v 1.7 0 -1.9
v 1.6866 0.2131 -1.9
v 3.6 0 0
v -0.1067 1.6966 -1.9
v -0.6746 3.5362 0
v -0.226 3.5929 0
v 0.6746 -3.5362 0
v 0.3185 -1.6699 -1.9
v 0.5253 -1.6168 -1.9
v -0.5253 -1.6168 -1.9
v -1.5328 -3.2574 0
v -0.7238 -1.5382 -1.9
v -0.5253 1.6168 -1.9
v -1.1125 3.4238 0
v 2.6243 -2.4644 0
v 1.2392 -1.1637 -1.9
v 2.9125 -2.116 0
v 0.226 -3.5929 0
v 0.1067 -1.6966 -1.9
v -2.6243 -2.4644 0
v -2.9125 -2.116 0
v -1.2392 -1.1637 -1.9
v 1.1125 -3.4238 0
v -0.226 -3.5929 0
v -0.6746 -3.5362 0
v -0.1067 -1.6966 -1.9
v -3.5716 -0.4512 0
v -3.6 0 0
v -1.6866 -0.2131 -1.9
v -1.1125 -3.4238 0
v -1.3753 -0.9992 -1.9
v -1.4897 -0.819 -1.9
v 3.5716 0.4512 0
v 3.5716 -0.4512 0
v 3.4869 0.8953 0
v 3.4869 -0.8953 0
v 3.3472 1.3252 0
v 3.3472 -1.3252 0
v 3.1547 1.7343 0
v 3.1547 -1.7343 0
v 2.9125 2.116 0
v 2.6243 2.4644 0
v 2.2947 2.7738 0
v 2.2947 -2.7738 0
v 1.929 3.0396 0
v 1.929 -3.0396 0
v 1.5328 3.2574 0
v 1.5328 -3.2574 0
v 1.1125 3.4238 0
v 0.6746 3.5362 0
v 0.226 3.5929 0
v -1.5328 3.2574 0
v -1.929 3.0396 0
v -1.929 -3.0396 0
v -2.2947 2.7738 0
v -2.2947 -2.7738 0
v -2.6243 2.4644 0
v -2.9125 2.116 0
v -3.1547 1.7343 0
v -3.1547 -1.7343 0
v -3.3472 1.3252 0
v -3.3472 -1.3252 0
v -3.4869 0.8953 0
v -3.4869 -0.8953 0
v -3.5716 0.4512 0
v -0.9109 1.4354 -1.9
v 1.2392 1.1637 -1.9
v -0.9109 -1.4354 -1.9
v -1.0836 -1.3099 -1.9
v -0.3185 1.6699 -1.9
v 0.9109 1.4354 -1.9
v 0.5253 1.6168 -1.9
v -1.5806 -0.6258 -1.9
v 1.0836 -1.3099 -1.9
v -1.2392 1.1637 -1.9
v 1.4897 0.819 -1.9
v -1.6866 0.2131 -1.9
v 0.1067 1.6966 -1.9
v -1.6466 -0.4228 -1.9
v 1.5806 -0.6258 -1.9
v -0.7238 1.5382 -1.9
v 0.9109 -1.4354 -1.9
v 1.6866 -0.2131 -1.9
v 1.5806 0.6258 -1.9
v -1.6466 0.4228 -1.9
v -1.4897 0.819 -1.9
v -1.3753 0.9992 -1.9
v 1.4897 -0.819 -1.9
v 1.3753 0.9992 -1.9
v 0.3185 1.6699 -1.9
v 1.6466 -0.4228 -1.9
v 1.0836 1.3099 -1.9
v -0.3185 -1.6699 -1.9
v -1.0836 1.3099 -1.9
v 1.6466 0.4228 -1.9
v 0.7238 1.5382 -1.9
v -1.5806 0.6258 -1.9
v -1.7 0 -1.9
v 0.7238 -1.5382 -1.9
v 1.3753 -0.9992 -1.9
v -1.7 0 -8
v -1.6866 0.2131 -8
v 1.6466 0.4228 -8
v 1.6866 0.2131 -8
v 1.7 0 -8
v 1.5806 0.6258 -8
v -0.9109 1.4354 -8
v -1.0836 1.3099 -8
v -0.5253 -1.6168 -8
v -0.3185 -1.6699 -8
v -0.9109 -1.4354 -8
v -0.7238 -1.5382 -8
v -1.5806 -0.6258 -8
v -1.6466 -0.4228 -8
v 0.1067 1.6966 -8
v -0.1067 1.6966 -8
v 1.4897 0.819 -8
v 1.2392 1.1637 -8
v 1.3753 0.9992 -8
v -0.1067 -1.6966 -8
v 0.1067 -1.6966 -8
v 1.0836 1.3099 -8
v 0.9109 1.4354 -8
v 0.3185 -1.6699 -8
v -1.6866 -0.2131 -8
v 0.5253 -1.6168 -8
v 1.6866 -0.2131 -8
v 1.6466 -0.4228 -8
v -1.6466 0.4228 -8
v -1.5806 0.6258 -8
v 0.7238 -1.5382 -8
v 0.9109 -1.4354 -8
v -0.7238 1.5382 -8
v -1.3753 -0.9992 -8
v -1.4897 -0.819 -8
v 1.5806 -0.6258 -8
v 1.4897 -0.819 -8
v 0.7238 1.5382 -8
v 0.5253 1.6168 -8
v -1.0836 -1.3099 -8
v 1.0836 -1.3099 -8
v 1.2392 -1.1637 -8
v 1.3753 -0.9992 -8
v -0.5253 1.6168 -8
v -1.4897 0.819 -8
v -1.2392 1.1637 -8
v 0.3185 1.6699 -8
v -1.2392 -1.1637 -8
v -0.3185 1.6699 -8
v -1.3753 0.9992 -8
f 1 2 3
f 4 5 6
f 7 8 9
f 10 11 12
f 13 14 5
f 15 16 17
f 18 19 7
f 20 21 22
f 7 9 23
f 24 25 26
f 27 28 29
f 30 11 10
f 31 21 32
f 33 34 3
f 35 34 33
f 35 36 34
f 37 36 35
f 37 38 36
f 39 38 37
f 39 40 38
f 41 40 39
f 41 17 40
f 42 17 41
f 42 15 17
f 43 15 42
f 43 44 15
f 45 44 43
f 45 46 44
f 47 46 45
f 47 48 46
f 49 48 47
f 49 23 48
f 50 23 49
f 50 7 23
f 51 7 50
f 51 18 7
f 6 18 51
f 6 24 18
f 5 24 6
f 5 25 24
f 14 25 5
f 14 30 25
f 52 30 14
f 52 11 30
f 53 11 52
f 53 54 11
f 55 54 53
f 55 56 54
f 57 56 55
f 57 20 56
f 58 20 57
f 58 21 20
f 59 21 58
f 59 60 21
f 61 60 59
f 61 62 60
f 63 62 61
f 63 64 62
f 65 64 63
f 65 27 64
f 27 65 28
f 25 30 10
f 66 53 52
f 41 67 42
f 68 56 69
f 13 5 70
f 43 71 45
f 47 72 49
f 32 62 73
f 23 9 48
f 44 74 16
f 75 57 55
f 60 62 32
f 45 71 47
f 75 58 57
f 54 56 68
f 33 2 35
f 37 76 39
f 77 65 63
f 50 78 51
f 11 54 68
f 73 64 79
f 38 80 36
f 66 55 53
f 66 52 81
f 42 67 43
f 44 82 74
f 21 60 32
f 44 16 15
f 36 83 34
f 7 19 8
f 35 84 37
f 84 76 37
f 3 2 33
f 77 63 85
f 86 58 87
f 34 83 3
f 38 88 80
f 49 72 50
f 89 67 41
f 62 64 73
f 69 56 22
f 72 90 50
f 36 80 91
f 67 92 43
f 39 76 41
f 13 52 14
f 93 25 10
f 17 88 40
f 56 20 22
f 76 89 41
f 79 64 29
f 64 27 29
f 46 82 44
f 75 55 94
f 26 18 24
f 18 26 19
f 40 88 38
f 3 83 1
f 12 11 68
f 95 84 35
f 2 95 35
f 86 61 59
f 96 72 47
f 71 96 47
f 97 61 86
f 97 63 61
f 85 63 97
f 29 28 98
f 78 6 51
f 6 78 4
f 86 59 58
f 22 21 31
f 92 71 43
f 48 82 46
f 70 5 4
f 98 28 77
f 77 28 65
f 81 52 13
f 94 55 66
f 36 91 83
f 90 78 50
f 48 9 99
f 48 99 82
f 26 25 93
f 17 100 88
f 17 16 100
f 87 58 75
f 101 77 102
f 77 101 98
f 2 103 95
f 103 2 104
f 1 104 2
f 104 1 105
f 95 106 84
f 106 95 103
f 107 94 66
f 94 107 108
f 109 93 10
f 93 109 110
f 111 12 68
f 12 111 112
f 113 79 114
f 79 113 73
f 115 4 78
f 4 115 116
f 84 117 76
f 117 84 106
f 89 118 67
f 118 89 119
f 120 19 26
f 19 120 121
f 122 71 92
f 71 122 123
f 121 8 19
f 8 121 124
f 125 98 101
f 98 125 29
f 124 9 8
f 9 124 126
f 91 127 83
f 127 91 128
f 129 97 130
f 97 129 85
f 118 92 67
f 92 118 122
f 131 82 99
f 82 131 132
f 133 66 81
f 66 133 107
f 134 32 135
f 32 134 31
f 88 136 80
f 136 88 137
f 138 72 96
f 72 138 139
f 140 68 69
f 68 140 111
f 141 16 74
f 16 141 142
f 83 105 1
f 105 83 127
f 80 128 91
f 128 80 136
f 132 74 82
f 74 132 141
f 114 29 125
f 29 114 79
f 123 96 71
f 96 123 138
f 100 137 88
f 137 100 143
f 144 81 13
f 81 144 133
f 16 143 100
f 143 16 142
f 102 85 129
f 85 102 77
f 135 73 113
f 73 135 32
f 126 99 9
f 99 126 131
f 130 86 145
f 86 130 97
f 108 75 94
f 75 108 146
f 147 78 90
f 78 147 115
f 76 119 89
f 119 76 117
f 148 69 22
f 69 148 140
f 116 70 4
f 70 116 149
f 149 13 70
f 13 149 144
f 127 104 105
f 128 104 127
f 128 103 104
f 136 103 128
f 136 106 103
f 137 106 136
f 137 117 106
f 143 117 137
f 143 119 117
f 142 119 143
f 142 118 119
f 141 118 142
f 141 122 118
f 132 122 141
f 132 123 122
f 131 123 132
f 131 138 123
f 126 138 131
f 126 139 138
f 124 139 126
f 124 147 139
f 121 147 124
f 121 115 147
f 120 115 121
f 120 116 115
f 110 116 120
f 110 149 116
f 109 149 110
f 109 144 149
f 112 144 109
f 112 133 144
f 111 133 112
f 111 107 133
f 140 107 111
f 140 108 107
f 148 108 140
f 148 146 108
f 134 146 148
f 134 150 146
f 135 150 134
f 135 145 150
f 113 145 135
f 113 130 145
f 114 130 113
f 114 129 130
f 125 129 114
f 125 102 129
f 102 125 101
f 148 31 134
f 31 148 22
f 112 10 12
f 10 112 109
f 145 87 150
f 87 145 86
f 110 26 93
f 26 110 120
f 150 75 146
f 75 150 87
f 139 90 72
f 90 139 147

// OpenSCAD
// Generated by SolidPython 1.1.3 on 2023-03-13 21:43:02
$fn = 50;


difference() {
	union() {
		translate(v = [0, 0, -1.9000000000]) {
			rotate(a = [0, 0, 0]) {
				cylinder(h = 1.9000000000, r1 = 1.7000000000, r2 = 3.6000000000);
			}
		}
		translate(v = [0, 0, -8]) {
			rotate(a = [0, 0, 0]) {
				cylinder(h = 8, r = 1.7000000000);
			}
		}
	}
	union();
}
/***********************************************
*********      SolidPython code:      **********
************************************************
 
from solid import *
import os
import subprocess

import oomB

import opsc_library_gen

mode = "laser"
#mode = "3d_print"

defined_objects = {}

radius_dict = {}
countersunk_dict = {}


def set_mode(m):
    global mode
    mode = m
    radius_dict['M6'] = 6.5/2
    radius_dict['M3'] = 3.3/2
    if mode == "laser":
        radius_dict['M6'] = 6/2
        radius_dict['M3'] = 3/2

    countersunk_dict['M3'] = {}
    countersunk_dict['M3']['little_rad'] = radius_dict['M3']
    countersunk_dict['M3']['big_rad'] = (5.5+0.6)/2
    if mode == "laser":
        countersunk_dict['M3']['big_rad'] = (4.75+0.6)/2
        countersunk_dict['M3']['little_rad'] = (4.75+0.6)/2

    countersunk_dict['M3']['height'] = 1.7


def opsc_make_object(filename, objects, save_type="none",resolution=50, layers = 1, tilediff = 200, mode="laser", overwrite=True):
    if overwrite or not os.path.exists(filename):
        set_mode(mode)
        save_type = save_type.lower()
        os.makedirs(os.path.dirname(filename), exist_ok=True)
        final_object = opsc_get_object(objects, mode = mode)
        # Save the final object to the specified filename    
        scad_render_to_file(final_object, filename, file_header='$fn = %s;' % resolution, include_orig_code=True)
        if save_type == "all":
            saveToAll(filename)
        elif save_type == "dxf":
            saveToDxf(filename)
        if mode == "laser":
            filename_laser = filename.replace(".scad","-flat.scad")
            scad_render_to_file(getLaser(final_object, layers=layers, tilediff=tilediff), filename_laser, file_header='$fn = %s;' % resolution, include_orig_code=True)
            if save_type == "all":
                saveToAll(filename_laser)
            elif save_type == "dxf":
                saveToDxf(filename_laser)


def opsc_get_object(objects, mode = "laser"):
    # Create the solidpython objects only include the positive objects and if they don't have inclusion or their inclusion is either all or mode
    # Initialize an empty list to store the results
    positive_objects = []

    # Iterate over the "objects" list
    for obj in objects:
        # Check if the current object has a "type" key with a value of "positive"
        if obj['type'] == 'positive':
            # Check if the current object has an "inclusion" key and its value matches "mode",
            # or if the current object does not have an "inclusion" key at all
            if not 'inclusion' in obj or obj['inclusion'] == "all" or obj['inclusion'] == mode:
                # Call the "get_opsc_item" function with the current object as an argument
                opsc_item = get_opsc_item(obj)
                # Add the result to the "positive_objects" list
                positive_objects.append(opsc_item)
# Initialize an empty list to store the results
    negative_objects = []

    # Iterate over the "objects" list
    for obj in objects:
        # Check if the current object has a "type" key with a value of "negative"
        if obj['type'] == 'negative':
            # Check if the current object has an "inclusion" key and its value matches "mode",
            # or if the current object does not have an "inclusion" key at all
            if not 'inclusion' in obj or obj['inclusion'] == "all" or obj['inclusion'] == mode:
                # Call the "get_opsc_item" function with the current object as an argument
                opsc_item = get_opsc_item(obj)
                # Add the result to the "negative_objects" list
                negative_objects.append(opsc_item)
    
    #positive_objects = [get_opsc_item(obj) for obj in objects if obj['type'] == 'positive']
    #negative_objects = [get_opsc_item(obj) for obj in objects if obj['type'] == 'negative']
    # Union the positive objects
    positive_object = union()(*positive_objects)
    # Union the negative objects
    negative_object = union()(*negative_objects)
    # Create the final object by subtracting the negative objects from the positive objects
    return difference()(positive_object, negative_object)

def get_opsc_item(params):
    # A dictionary to map radius string values to numerical values
    #radius_dict = {'small': 5, 'medium': 10, 'large': 15}
    # An array of function names for basic shapes
    basic_shapes = ['cube', 'sphere', 'cylinder']
    
    # An array of function names for other shapes
    other_shapes = ['hole', 'slot', 'rounded_rectangle', 'countersunk', 'polyg']
    


    # Convert radius to r if present, and remove radius from the params dictionary
    if 'radius' in params:
        if isinstance(params['radius'], str):
            # Use the radius_dict to map the radius string value to a numerical value
            params['r'] = radius_dict[params['radius']]
        else:
            params['r'] = params['radius']
        del params['radius']
    

    # Check if the object type is a basic shape
    if params['shape'] in basic_shapes:
        # Remove shape and unexpected dictionary values
        allowed_keys = {'size', 'r', 'r1', 'r2', 'd', 'h', 'rw', 'rh', 'dw', 'dh'}
        shape_params = {k: v for k, v in params.items() if k in allowed_keys}

        #params['m'] = "#"
        ###split for adding modifier
        try:
            m = params['m']
            func = globals()[params['shape']]
            return_value = get_opsc_transform(params,func(**shape_params))
            return_value = (return_value).set_modifier(m)
            return return_value
        except KeyError as e:
            return get_opsc_transform(params,globals()[params['shape']](**shape_params))
        
    elif params['shape'] == 'polygon':
        # Remove shape and unexpected dictionary values
        h  = params['height']
        allowed_keys = {'points'}
        shape_params = {k: v for k, v in params.items() if k in allowed_keys}

        # Call the corresponding function for the shape parameter, using ** notation to pass the shape_params dictionary as keyword arguments
        params["rot"] = [0,0,0]        
        try:
            m = params['m']
            func = globals()[params['shape']]
            return_value = get_opsc_transform(params,linear_extrude(h)(globals()[params['shape']](**shape_params)))
            return_value = (return_value).set_modifier(m)
            return return_value
        except KeyError as e:
            return_value = get_opsc_transform(params,linear_extrude(h)(globals()[params['shape']](**shape_params)))
            return_value = (return_value)
            return return_value


    # If the object type is not a basic shape, check if it's a defined object or one of the other shapes
    elif params['shape'] in other_shapes:
        # Call the corresponding function for the shape parameter, passing the params dictionary as an argument
        p2 = copy.deepcopy(params)
        p2["pos"] = [0,0,0]
        return get_opsc_transform(params,globals()[params['shape']](p2))
    
    # If the object is not a basic shape or a defined object, try to import it from a .scad file
    else:
        obj = defined_objects[params['shape']]
        return get_opsc_transform(params,obj)

def get_opsc_transform(params, solid_obj):
    # Rotate the object based on the 'rot' field in the params dictionary, or the 'rotX', 'rotY', and 'rotZ' fields if 'rot' is not present
    rot = params.get('rot', [])
    if rot:
        rotX, rotY, rotZ = rot
    else:
        rotX = params.get('rotX', 0)
        rotY = params.get('rotY', 0)
        rotZ = params.get('rotZ', 0)
    solid_obj = rotate([rotX, rotY, rotZ])(solid_obj)

    # Translate the object based on the 'pos' field in the params dictionary, or the 'x', 'y', and 'z' fields if 'pos' is not present
    pos = params.get('pos', [])
    if pos:
        x, y, z = pos
    else:
        x = params.get('x', 0)
        y = params.get('y', 0)
        z = params.get('z', 0)
    solid_obj = translate([x, y, z])(solid_obj)
    return solid_obj


import random

def opsc_easy_array(type, shape, repeats, pos_start, shift_arr, **kwargs):
    for i in range(0,3):
        repeats.append(1)
        pos_start.append(0)
        shift_arr.append(0)
    return_objects = []

    for x in range(0,repeats[0]):
        for y in range(0,repeats[1]):
            for z in range(0,repeats[2]):
                return_objects.append(opsc_easy(type, shape, pos=[pos_start[0]+x*shift_arr[0],pos_start[1]+y*shift_arr[1],pos_start[2]+z*shift_arr[2]], **kwargs))
    return return_objects                



def opsc_easy(type, shape, **kwargs):
    obj = {
        'type': type,
        'shape': shape
    }
    for param in ['size', 'r', 'r1', 'r2', 'd', 'h', 'rw', 'rh', 'dw', 'dh', 'pos', 'x', 'y', 'z', 'rot', 'rotX', 'rotY', 'rotZ', "w", "inclusion", 'sides', 'height', "m"]:
        if param in kwargs:
            obj[param] = kwargs[param]
    return obj

def hole(params):
    p2 = copy.deepcopy(params)  
    # Check if the radius is a string and replace it with the corresponding value from the dictionary
    if isinstance(p2['r'], str):
        p2['r'] = radius_dict[p2['r']]
    
    # Set the height to 100 if not specified
    if 'h' not in p2:
        p2['h'] = 100
        p2["pos"] = [0,0,-50]
    p2["center"] = True
    # Create the cylinder object
    p2["shape"] = "cylinder"
    p2["type"] = "positive"

    return get_opsc_item(p2)

import copy

def countersunk(params):
    p2 = copy.deepcopy(params)
    counter_rad = p2['r']
    p2['r'] = radius_dict[p2['r']]
    hp = copy.deepcopy(p2)
    hp["type"] = "positive"
    hp["shape"] = "hole"
    del hp["rot"]
    hol = get_opsc_item(hp)
    
    cp = copy.deepcopy(p2)
    cp["h"] = countersunk_dict[counter_rad]["height"]
    cp["r2"] = countersunk_dict[counter_rad]["little_rad"]
    cp["r1"] = countersunk_dict[counter_rad]["big_rad"]
    del cp["r"]
    del cp["rot"]
    cp["type"] = "positive"
    cp["shape"] = "cylinder"
    cp["pos"] = [0,0,0]

    top = get_opsc_item(cp)
    return union()(hol,top)



def slot(params):  
    p2 = copy.deepcopy(params) 
    if isinstance(p2['r'], str):
        p2['r'] = radius_dict[p2['r']]
    p2["type"] = "positive"
    p2["shape"] = "hole"
    del p2["rot"]
    p2["pos"] = [0,0,0]
    left = copy.deepcopy(p2)
    right = copy.deepcopy(p2)
    left["pos"][0] = p2["w"] / 2 - p2["r"] 
    
    right["pos"][0] = -p2["w"] / 2 + p2["r"] 
    pass
    leftObj = get_opsc_item(left)
    rightObj = get_opsc_item(right)
    return hull()(leftObj, rightObj)

def rounded_rectangle(params):   
    p2 = copy.deepcopy(params) 
    p2["h"] = p2["size"][2]
    p2["pos"] = p2.get("pos", [0, 0, 0]) 
    p2["type"] = "positive"
    p2["shape"] = "hole"
    p2["pos"] = [0,0,0]
    
    if 'rot' in p2:
        del p2["rot"]   
    if 'r' not in p2:
        p2["r"] = 5 
    tl = copy.deepcopy(p2)
    tr = copy.deepcopy(p2)
    bl = copy.deepcopy(p2)
    br = copy.deepcopy(p2)
    tl["pos"][0] = -(p2["size"][0] - p2["r"]*2)/2
    tl["pos"][1] = (p2["size"][1] - p2["r"]*2)/2
    tr["pos"][0] = (p2["size"][0] - p2["r"]*2)/2
    tr["pos"][1] = (p2["size"][1] - p2["r"]*2)/2
    bl["pos"][0] = -(p2["size"][0] - p2["r"]*2)/2
    bl["pos"][1] = -(p2["size"][1] - p2["r"]*2)/2
    br["pos"][0] = (p2["size"][0] - p2["r"]*2)/2
    br["pos"][1] = -(p2["size"][1] - p2["r"]*2)/2
    del tl["size"]
    del tr["size"]
    del bl["size"]
    del br["size"]
    tlo = get_opsc_item(tl)
    tro = get_opsc_item(tr)
    blo = get_opsc_item(bl)
    bro = get_opsc_item(br)    
    return hull()(tlo, tro, blo, bro)



def polyg(params):
    p2 = copy.deepcopy(params) 
    p2["type"] = "positive"
    p2["shape"] = "polygon"
    p2["pos"] = [0,0,0]
    sides = p2["sides"]
    radius = p2["r"]    
    angles = [i * 360 / sides for i in range(sides)]
    points = regular_polygon(sides, radius)
    
    p2["points"] = points
    return get_opsc_item(p2)

import math

def regular_polygon(num_sides, radius):
    # Calculate the angle between each side
    angle = 2 * math.pi / num_sides

    # Calculate the points of the polygon
    points = []
    for i in range(num_sides):
        x = radius * math.cos(i * angle)
        y = radius * math.sin(i * angle)
        points.append((x, y))
    return points

def import_scad_object(filename):
    # Import the .scad file and convert it to a solidpython object
    #filename = "parts"
    obj = import_scad(filename)
    return obj.main()



import os
import solid as solidpython

# A dictionary to store the defined objects


def load_scad_objects():
    opsc_library_gen.gen_library(defined_objects)

import random

def test(num_objects):
    objects = []
    for i in range(num_objects):
        # Choose a random shape
        #shape = random.choice(['cube', 'sphere', 'cylinder', 'hole', 'slot', "rounded_rectangle"])
        shape = random.choice(["rounded_rectangle"])

        # Choose a random type
        type = random.choice(['positive', 'negative'])
        
        # Create an empty object dictionary
        obj = {'shape': shape, 'type': type}
        
        # Set shape-specific parameters
        if obj['shape'] in ['cube']:
            obj['size'] =  [random.uniform(5, 15), random.uniform(5, 15), random.uniform(5, 15)]
        if obj['shape'] in ['rounded_rectangle']:
            obj['size'] =  [random.uniform(5, 15), random.uniform(5, 15), random.uniform(5, 15)]
            obj['r'] = random.uniform(0.5, 5)
        elif obj['shape'] == 'sphere':
            obj['r'] = random.uniform(5, 15)
        elif obj['shape'] in ['cylinder', 'hole']:
            obj['r'] = random.uniform(0.5, 5)
            obj['h'] = random.uniform(5, 15)
        elif obj['shape'] == 'slot':
            obj['r'] = random.uniform(0.5, 5)
            obj['h'] = random.uniform(5, 15)
            obj['w'] = random.uniform(5, 15)
        
        # Set a random position and rotation
        obj['pos'] = [random.uniform(-20, 20), random.uniform(-20, 20), random.uniform(-20, 20)]
        obj['rot'] = [random.uniform(-180, 180), random.uniform(-180, 180), random.uniform(-180, 180)]
        
        # Add the object to the list
        objects.append(obj)
    return objects

####### old file saving
def saveToAll(fileIn):
    saveToStl(fileIn)
    saveToDxf(fileIn)
    saveToPng(fileIn)
    saveToSvg(fileIn)

def saveToDxf(fileIn, fileOut="", copy_to_laser=True):
    if fileOut == "":
        fileOut = fileIn.replace(".scad",".dxf")
    saveToFile(fileIn, fileOut)


    
def saveToPng(fileIn, fileOut="",extra="--render"):
    if fileOut == "":
        fileOut = fileIn.replace(".scad",".png")
    saveToFile(fileIn, fileOut)

def saveToStl(fileIn, fileOut=""):
    if fileOut == "":
        fileOut = fileIn.replace(".scad",".stl")
    saveToFile(fileIn, fileOut)
    
def saveToSvg(fileIn, fileOut=""):
    if fileOut == "":
        fileOut = fileIn.replace(".scad",".svg")
    saveToFile(fileIn, fileOut)

def saveToFile(fileIn, fileOut,extra=""):
    #extra = extra + " --colorscheme Tomorrow"

    launchStr = 'openscad -o "' + fileOut + '"' + extra + ' "' + fileIn + '"'
    if ".png" in fileOut:
        launchStr = launchStr + " --render"
    print("            saveToFile launch string: " + launchStr)
    subprocess.run(launchStr)
    x=0

def getLaser(final_object,start=1.5,layers=1,thickness=3,tilediff=200):
        rv= []

        for x in range(layers):
            rv.append(translate([0,x*tilediff,0])(
                    projection()(
                        intersection()(translate([-500,-500,start+x*thickness])(cube(size=[1000,1000,0.1])),
                            final_object
                        )
                    )
            )
            )
            
        return union()(rv)

set_mode("laser")
load_scad_objects() 
 
************************************************/
